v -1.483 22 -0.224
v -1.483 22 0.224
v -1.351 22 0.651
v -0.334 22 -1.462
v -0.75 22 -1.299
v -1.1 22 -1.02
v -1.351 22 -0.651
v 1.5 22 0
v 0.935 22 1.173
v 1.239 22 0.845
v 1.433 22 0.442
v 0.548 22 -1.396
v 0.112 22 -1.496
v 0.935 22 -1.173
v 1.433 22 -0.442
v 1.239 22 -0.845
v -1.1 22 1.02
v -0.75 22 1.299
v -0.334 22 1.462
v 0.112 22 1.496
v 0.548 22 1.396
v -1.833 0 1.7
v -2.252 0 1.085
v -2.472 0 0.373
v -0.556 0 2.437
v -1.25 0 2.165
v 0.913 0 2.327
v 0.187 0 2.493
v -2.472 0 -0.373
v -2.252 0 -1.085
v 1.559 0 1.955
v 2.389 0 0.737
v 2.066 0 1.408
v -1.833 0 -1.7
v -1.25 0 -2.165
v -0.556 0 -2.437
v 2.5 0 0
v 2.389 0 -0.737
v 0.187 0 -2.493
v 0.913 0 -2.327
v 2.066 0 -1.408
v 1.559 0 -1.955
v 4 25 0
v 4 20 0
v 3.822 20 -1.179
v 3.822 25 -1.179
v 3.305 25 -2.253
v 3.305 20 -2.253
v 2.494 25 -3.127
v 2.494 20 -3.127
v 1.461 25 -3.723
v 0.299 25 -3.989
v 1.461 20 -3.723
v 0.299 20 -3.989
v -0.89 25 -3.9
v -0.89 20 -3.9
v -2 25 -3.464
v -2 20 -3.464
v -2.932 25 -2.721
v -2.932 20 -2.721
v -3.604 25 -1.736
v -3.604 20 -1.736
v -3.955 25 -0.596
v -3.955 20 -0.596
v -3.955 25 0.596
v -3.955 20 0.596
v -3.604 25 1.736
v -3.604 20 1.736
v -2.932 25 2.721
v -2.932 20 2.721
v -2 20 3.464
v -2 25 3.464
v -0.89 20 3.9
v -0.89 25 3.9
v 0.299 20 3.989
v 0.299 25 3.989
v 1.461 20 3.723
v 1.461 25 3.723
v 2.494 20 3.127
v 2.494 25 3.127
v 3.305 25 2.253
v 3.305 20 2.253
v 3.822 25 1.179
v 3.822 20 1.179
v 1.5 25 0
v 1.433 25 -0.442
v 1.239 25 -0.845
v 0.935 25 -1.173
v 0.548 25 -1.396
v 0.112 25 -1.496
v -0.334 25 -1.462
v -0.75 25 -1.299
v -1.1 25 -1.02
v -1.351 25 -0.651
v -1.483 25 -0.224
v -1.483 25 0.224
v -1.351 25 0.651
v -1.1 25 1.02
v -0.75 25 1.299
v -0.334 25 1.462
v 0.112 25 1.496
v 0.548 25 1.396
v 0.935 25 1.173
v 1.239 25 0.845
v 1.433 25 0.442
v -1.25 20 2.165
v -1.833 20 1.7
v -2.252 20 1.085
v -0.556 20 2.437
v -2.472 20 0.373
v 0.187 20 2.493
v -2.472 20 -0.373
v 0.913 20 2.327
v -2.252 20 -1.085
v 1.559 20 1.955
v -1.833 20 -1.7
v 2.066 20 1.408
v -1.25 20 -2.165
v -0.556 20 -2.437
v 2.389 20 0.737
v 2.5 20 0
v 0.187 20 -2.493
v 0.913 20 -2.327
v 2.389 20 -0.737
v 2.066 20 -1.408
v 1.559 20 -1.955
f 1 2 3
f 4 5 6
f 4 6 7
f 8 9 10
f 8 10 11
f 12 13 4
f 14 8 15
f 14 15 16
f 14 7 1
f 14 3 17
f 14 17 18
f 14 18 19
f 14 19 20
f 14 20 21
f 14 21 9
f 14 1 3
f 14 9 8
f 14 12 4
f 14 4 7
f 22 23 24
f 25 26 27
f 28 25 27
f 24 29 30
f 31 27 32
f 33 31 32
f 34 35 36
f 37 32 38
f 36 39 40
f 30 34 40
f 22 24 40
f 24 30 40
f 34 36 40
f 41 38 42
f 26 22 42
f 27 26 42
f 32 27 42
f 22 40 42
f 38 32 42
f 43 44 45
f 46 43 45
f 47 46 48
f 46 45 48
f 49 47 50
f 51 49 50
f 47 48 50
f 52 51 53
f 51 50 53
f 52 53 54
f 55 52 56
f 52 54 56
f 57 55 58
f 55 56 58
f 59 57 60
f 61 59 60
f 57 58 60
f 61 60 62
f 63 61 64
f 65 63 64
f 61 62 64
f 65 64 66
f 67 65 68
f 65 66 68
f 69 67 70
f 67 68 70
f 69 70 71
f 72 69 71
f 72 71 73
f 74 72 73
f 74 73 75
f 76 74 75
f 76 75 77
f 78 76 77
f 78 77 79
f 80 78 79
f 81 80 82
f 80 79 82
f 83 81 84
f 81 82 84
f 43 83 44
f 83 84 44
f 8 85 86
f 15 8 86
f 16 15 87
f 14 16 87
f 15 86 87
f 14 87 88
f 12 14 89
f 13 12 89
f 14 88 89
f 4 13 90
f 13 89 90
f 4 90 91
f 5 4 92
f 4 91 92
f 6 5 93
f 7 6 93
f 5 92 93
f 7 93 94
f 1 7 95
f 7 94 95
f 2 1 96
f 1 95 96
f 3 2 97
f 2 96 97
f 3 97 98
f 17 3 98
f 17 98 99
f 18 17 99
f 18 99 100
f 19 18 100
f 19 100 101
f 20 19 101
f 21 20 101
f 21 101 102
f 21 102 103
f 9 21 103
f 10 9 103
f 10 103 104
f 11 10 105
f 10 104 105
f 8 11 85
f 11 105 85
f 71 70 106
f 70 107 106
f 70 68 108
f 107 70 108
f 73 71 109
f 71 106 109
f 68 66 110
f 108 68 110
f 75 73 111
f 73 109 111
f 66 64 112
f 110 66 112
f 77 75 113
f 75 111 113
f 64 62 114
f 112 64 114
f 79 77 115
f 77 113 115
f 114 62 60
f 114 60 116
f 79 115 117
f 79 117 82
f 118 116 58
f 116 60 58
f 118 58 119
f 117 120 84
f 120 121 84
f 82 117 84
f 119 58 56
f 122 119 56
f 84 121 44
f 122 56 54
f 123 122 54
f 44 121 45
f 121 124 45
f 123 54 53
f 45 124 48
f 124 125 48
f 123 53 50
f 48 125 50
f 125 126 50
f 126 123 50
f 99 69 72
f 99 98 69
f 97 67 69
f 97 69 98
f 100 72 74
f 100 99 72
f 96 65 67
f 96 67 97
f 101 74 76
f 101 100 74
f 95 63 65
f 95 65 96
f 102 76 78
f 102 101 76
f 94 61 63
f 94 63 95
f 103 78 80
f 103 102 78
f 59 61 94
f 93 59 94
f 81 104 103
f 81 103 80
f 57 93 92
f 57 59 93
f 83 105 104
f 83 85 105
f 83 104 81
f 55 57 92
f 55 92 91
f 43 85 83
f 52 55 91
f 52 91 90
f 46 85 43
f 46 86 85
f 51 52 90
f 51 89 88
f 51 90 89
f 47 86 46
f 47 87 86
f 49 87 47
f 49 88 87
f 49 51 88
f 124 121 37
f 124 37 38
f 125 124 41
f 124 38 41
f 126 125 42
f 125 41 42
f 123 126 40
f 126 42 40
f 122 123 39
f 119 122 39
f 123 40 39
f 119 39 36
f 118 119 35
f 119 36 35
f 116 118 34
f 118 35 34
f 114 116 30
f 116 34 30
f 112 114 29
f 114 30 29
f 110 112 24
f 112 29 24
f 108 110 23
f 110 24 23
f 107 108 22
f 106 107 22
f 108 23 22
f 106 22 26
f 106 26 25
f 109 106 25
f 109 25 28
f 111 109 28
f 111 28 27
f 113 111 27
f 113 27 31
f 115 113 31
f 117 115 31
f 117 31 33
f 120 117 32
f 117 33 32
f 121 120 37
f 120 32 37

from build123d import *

# Parameters (mm, degrees)
SKETCH1_R           = 2.5
BOSS_EXTRUDE1_DEPTH = 20
SKETCH2_R           = 4
BOSS_EXTRUDE2_DEPTH = 5
SKETCH3_R           = 1.5
CUT_EXTRUDE1_DEPTH  = 3


with BuildPart() as part:
    # Sketch1 → Boss-Extrude1 (new body)
    with BuildSketch(Plane(origin=(0, 0, 0), x_dir=(1, 0, 0), z_dir=(0, 1, 0))):
        Circle(SKETCH1_R)
    extrude(amount=BOSS_EXTRUDE1_DEPTH)

    # Sketch2 → Boss-Extrude2 (add)
    with BuildSketch(Plane(origin=(0, 20, 0), x_dir=(1, 0, 0), z_dir=(0, 1, 0))):
        Circle(SKETCH2_R)
    extrude(amount=BOSS_EXTRUDE2_DEPTH)

    # Sketch3 → Cut-Extrude1 (cut)
    with BuildSketch(Plane(origin=(0, 25, 0), x_dir=(1, 0, 0), z_dir=(0, 1, 0))):
        Circle(SKETCH3_R)
    extrude(amount=-CUT_EXTRUDE1_DEPTH, mode=Mode.SUBTRACT)


solid = part.part
